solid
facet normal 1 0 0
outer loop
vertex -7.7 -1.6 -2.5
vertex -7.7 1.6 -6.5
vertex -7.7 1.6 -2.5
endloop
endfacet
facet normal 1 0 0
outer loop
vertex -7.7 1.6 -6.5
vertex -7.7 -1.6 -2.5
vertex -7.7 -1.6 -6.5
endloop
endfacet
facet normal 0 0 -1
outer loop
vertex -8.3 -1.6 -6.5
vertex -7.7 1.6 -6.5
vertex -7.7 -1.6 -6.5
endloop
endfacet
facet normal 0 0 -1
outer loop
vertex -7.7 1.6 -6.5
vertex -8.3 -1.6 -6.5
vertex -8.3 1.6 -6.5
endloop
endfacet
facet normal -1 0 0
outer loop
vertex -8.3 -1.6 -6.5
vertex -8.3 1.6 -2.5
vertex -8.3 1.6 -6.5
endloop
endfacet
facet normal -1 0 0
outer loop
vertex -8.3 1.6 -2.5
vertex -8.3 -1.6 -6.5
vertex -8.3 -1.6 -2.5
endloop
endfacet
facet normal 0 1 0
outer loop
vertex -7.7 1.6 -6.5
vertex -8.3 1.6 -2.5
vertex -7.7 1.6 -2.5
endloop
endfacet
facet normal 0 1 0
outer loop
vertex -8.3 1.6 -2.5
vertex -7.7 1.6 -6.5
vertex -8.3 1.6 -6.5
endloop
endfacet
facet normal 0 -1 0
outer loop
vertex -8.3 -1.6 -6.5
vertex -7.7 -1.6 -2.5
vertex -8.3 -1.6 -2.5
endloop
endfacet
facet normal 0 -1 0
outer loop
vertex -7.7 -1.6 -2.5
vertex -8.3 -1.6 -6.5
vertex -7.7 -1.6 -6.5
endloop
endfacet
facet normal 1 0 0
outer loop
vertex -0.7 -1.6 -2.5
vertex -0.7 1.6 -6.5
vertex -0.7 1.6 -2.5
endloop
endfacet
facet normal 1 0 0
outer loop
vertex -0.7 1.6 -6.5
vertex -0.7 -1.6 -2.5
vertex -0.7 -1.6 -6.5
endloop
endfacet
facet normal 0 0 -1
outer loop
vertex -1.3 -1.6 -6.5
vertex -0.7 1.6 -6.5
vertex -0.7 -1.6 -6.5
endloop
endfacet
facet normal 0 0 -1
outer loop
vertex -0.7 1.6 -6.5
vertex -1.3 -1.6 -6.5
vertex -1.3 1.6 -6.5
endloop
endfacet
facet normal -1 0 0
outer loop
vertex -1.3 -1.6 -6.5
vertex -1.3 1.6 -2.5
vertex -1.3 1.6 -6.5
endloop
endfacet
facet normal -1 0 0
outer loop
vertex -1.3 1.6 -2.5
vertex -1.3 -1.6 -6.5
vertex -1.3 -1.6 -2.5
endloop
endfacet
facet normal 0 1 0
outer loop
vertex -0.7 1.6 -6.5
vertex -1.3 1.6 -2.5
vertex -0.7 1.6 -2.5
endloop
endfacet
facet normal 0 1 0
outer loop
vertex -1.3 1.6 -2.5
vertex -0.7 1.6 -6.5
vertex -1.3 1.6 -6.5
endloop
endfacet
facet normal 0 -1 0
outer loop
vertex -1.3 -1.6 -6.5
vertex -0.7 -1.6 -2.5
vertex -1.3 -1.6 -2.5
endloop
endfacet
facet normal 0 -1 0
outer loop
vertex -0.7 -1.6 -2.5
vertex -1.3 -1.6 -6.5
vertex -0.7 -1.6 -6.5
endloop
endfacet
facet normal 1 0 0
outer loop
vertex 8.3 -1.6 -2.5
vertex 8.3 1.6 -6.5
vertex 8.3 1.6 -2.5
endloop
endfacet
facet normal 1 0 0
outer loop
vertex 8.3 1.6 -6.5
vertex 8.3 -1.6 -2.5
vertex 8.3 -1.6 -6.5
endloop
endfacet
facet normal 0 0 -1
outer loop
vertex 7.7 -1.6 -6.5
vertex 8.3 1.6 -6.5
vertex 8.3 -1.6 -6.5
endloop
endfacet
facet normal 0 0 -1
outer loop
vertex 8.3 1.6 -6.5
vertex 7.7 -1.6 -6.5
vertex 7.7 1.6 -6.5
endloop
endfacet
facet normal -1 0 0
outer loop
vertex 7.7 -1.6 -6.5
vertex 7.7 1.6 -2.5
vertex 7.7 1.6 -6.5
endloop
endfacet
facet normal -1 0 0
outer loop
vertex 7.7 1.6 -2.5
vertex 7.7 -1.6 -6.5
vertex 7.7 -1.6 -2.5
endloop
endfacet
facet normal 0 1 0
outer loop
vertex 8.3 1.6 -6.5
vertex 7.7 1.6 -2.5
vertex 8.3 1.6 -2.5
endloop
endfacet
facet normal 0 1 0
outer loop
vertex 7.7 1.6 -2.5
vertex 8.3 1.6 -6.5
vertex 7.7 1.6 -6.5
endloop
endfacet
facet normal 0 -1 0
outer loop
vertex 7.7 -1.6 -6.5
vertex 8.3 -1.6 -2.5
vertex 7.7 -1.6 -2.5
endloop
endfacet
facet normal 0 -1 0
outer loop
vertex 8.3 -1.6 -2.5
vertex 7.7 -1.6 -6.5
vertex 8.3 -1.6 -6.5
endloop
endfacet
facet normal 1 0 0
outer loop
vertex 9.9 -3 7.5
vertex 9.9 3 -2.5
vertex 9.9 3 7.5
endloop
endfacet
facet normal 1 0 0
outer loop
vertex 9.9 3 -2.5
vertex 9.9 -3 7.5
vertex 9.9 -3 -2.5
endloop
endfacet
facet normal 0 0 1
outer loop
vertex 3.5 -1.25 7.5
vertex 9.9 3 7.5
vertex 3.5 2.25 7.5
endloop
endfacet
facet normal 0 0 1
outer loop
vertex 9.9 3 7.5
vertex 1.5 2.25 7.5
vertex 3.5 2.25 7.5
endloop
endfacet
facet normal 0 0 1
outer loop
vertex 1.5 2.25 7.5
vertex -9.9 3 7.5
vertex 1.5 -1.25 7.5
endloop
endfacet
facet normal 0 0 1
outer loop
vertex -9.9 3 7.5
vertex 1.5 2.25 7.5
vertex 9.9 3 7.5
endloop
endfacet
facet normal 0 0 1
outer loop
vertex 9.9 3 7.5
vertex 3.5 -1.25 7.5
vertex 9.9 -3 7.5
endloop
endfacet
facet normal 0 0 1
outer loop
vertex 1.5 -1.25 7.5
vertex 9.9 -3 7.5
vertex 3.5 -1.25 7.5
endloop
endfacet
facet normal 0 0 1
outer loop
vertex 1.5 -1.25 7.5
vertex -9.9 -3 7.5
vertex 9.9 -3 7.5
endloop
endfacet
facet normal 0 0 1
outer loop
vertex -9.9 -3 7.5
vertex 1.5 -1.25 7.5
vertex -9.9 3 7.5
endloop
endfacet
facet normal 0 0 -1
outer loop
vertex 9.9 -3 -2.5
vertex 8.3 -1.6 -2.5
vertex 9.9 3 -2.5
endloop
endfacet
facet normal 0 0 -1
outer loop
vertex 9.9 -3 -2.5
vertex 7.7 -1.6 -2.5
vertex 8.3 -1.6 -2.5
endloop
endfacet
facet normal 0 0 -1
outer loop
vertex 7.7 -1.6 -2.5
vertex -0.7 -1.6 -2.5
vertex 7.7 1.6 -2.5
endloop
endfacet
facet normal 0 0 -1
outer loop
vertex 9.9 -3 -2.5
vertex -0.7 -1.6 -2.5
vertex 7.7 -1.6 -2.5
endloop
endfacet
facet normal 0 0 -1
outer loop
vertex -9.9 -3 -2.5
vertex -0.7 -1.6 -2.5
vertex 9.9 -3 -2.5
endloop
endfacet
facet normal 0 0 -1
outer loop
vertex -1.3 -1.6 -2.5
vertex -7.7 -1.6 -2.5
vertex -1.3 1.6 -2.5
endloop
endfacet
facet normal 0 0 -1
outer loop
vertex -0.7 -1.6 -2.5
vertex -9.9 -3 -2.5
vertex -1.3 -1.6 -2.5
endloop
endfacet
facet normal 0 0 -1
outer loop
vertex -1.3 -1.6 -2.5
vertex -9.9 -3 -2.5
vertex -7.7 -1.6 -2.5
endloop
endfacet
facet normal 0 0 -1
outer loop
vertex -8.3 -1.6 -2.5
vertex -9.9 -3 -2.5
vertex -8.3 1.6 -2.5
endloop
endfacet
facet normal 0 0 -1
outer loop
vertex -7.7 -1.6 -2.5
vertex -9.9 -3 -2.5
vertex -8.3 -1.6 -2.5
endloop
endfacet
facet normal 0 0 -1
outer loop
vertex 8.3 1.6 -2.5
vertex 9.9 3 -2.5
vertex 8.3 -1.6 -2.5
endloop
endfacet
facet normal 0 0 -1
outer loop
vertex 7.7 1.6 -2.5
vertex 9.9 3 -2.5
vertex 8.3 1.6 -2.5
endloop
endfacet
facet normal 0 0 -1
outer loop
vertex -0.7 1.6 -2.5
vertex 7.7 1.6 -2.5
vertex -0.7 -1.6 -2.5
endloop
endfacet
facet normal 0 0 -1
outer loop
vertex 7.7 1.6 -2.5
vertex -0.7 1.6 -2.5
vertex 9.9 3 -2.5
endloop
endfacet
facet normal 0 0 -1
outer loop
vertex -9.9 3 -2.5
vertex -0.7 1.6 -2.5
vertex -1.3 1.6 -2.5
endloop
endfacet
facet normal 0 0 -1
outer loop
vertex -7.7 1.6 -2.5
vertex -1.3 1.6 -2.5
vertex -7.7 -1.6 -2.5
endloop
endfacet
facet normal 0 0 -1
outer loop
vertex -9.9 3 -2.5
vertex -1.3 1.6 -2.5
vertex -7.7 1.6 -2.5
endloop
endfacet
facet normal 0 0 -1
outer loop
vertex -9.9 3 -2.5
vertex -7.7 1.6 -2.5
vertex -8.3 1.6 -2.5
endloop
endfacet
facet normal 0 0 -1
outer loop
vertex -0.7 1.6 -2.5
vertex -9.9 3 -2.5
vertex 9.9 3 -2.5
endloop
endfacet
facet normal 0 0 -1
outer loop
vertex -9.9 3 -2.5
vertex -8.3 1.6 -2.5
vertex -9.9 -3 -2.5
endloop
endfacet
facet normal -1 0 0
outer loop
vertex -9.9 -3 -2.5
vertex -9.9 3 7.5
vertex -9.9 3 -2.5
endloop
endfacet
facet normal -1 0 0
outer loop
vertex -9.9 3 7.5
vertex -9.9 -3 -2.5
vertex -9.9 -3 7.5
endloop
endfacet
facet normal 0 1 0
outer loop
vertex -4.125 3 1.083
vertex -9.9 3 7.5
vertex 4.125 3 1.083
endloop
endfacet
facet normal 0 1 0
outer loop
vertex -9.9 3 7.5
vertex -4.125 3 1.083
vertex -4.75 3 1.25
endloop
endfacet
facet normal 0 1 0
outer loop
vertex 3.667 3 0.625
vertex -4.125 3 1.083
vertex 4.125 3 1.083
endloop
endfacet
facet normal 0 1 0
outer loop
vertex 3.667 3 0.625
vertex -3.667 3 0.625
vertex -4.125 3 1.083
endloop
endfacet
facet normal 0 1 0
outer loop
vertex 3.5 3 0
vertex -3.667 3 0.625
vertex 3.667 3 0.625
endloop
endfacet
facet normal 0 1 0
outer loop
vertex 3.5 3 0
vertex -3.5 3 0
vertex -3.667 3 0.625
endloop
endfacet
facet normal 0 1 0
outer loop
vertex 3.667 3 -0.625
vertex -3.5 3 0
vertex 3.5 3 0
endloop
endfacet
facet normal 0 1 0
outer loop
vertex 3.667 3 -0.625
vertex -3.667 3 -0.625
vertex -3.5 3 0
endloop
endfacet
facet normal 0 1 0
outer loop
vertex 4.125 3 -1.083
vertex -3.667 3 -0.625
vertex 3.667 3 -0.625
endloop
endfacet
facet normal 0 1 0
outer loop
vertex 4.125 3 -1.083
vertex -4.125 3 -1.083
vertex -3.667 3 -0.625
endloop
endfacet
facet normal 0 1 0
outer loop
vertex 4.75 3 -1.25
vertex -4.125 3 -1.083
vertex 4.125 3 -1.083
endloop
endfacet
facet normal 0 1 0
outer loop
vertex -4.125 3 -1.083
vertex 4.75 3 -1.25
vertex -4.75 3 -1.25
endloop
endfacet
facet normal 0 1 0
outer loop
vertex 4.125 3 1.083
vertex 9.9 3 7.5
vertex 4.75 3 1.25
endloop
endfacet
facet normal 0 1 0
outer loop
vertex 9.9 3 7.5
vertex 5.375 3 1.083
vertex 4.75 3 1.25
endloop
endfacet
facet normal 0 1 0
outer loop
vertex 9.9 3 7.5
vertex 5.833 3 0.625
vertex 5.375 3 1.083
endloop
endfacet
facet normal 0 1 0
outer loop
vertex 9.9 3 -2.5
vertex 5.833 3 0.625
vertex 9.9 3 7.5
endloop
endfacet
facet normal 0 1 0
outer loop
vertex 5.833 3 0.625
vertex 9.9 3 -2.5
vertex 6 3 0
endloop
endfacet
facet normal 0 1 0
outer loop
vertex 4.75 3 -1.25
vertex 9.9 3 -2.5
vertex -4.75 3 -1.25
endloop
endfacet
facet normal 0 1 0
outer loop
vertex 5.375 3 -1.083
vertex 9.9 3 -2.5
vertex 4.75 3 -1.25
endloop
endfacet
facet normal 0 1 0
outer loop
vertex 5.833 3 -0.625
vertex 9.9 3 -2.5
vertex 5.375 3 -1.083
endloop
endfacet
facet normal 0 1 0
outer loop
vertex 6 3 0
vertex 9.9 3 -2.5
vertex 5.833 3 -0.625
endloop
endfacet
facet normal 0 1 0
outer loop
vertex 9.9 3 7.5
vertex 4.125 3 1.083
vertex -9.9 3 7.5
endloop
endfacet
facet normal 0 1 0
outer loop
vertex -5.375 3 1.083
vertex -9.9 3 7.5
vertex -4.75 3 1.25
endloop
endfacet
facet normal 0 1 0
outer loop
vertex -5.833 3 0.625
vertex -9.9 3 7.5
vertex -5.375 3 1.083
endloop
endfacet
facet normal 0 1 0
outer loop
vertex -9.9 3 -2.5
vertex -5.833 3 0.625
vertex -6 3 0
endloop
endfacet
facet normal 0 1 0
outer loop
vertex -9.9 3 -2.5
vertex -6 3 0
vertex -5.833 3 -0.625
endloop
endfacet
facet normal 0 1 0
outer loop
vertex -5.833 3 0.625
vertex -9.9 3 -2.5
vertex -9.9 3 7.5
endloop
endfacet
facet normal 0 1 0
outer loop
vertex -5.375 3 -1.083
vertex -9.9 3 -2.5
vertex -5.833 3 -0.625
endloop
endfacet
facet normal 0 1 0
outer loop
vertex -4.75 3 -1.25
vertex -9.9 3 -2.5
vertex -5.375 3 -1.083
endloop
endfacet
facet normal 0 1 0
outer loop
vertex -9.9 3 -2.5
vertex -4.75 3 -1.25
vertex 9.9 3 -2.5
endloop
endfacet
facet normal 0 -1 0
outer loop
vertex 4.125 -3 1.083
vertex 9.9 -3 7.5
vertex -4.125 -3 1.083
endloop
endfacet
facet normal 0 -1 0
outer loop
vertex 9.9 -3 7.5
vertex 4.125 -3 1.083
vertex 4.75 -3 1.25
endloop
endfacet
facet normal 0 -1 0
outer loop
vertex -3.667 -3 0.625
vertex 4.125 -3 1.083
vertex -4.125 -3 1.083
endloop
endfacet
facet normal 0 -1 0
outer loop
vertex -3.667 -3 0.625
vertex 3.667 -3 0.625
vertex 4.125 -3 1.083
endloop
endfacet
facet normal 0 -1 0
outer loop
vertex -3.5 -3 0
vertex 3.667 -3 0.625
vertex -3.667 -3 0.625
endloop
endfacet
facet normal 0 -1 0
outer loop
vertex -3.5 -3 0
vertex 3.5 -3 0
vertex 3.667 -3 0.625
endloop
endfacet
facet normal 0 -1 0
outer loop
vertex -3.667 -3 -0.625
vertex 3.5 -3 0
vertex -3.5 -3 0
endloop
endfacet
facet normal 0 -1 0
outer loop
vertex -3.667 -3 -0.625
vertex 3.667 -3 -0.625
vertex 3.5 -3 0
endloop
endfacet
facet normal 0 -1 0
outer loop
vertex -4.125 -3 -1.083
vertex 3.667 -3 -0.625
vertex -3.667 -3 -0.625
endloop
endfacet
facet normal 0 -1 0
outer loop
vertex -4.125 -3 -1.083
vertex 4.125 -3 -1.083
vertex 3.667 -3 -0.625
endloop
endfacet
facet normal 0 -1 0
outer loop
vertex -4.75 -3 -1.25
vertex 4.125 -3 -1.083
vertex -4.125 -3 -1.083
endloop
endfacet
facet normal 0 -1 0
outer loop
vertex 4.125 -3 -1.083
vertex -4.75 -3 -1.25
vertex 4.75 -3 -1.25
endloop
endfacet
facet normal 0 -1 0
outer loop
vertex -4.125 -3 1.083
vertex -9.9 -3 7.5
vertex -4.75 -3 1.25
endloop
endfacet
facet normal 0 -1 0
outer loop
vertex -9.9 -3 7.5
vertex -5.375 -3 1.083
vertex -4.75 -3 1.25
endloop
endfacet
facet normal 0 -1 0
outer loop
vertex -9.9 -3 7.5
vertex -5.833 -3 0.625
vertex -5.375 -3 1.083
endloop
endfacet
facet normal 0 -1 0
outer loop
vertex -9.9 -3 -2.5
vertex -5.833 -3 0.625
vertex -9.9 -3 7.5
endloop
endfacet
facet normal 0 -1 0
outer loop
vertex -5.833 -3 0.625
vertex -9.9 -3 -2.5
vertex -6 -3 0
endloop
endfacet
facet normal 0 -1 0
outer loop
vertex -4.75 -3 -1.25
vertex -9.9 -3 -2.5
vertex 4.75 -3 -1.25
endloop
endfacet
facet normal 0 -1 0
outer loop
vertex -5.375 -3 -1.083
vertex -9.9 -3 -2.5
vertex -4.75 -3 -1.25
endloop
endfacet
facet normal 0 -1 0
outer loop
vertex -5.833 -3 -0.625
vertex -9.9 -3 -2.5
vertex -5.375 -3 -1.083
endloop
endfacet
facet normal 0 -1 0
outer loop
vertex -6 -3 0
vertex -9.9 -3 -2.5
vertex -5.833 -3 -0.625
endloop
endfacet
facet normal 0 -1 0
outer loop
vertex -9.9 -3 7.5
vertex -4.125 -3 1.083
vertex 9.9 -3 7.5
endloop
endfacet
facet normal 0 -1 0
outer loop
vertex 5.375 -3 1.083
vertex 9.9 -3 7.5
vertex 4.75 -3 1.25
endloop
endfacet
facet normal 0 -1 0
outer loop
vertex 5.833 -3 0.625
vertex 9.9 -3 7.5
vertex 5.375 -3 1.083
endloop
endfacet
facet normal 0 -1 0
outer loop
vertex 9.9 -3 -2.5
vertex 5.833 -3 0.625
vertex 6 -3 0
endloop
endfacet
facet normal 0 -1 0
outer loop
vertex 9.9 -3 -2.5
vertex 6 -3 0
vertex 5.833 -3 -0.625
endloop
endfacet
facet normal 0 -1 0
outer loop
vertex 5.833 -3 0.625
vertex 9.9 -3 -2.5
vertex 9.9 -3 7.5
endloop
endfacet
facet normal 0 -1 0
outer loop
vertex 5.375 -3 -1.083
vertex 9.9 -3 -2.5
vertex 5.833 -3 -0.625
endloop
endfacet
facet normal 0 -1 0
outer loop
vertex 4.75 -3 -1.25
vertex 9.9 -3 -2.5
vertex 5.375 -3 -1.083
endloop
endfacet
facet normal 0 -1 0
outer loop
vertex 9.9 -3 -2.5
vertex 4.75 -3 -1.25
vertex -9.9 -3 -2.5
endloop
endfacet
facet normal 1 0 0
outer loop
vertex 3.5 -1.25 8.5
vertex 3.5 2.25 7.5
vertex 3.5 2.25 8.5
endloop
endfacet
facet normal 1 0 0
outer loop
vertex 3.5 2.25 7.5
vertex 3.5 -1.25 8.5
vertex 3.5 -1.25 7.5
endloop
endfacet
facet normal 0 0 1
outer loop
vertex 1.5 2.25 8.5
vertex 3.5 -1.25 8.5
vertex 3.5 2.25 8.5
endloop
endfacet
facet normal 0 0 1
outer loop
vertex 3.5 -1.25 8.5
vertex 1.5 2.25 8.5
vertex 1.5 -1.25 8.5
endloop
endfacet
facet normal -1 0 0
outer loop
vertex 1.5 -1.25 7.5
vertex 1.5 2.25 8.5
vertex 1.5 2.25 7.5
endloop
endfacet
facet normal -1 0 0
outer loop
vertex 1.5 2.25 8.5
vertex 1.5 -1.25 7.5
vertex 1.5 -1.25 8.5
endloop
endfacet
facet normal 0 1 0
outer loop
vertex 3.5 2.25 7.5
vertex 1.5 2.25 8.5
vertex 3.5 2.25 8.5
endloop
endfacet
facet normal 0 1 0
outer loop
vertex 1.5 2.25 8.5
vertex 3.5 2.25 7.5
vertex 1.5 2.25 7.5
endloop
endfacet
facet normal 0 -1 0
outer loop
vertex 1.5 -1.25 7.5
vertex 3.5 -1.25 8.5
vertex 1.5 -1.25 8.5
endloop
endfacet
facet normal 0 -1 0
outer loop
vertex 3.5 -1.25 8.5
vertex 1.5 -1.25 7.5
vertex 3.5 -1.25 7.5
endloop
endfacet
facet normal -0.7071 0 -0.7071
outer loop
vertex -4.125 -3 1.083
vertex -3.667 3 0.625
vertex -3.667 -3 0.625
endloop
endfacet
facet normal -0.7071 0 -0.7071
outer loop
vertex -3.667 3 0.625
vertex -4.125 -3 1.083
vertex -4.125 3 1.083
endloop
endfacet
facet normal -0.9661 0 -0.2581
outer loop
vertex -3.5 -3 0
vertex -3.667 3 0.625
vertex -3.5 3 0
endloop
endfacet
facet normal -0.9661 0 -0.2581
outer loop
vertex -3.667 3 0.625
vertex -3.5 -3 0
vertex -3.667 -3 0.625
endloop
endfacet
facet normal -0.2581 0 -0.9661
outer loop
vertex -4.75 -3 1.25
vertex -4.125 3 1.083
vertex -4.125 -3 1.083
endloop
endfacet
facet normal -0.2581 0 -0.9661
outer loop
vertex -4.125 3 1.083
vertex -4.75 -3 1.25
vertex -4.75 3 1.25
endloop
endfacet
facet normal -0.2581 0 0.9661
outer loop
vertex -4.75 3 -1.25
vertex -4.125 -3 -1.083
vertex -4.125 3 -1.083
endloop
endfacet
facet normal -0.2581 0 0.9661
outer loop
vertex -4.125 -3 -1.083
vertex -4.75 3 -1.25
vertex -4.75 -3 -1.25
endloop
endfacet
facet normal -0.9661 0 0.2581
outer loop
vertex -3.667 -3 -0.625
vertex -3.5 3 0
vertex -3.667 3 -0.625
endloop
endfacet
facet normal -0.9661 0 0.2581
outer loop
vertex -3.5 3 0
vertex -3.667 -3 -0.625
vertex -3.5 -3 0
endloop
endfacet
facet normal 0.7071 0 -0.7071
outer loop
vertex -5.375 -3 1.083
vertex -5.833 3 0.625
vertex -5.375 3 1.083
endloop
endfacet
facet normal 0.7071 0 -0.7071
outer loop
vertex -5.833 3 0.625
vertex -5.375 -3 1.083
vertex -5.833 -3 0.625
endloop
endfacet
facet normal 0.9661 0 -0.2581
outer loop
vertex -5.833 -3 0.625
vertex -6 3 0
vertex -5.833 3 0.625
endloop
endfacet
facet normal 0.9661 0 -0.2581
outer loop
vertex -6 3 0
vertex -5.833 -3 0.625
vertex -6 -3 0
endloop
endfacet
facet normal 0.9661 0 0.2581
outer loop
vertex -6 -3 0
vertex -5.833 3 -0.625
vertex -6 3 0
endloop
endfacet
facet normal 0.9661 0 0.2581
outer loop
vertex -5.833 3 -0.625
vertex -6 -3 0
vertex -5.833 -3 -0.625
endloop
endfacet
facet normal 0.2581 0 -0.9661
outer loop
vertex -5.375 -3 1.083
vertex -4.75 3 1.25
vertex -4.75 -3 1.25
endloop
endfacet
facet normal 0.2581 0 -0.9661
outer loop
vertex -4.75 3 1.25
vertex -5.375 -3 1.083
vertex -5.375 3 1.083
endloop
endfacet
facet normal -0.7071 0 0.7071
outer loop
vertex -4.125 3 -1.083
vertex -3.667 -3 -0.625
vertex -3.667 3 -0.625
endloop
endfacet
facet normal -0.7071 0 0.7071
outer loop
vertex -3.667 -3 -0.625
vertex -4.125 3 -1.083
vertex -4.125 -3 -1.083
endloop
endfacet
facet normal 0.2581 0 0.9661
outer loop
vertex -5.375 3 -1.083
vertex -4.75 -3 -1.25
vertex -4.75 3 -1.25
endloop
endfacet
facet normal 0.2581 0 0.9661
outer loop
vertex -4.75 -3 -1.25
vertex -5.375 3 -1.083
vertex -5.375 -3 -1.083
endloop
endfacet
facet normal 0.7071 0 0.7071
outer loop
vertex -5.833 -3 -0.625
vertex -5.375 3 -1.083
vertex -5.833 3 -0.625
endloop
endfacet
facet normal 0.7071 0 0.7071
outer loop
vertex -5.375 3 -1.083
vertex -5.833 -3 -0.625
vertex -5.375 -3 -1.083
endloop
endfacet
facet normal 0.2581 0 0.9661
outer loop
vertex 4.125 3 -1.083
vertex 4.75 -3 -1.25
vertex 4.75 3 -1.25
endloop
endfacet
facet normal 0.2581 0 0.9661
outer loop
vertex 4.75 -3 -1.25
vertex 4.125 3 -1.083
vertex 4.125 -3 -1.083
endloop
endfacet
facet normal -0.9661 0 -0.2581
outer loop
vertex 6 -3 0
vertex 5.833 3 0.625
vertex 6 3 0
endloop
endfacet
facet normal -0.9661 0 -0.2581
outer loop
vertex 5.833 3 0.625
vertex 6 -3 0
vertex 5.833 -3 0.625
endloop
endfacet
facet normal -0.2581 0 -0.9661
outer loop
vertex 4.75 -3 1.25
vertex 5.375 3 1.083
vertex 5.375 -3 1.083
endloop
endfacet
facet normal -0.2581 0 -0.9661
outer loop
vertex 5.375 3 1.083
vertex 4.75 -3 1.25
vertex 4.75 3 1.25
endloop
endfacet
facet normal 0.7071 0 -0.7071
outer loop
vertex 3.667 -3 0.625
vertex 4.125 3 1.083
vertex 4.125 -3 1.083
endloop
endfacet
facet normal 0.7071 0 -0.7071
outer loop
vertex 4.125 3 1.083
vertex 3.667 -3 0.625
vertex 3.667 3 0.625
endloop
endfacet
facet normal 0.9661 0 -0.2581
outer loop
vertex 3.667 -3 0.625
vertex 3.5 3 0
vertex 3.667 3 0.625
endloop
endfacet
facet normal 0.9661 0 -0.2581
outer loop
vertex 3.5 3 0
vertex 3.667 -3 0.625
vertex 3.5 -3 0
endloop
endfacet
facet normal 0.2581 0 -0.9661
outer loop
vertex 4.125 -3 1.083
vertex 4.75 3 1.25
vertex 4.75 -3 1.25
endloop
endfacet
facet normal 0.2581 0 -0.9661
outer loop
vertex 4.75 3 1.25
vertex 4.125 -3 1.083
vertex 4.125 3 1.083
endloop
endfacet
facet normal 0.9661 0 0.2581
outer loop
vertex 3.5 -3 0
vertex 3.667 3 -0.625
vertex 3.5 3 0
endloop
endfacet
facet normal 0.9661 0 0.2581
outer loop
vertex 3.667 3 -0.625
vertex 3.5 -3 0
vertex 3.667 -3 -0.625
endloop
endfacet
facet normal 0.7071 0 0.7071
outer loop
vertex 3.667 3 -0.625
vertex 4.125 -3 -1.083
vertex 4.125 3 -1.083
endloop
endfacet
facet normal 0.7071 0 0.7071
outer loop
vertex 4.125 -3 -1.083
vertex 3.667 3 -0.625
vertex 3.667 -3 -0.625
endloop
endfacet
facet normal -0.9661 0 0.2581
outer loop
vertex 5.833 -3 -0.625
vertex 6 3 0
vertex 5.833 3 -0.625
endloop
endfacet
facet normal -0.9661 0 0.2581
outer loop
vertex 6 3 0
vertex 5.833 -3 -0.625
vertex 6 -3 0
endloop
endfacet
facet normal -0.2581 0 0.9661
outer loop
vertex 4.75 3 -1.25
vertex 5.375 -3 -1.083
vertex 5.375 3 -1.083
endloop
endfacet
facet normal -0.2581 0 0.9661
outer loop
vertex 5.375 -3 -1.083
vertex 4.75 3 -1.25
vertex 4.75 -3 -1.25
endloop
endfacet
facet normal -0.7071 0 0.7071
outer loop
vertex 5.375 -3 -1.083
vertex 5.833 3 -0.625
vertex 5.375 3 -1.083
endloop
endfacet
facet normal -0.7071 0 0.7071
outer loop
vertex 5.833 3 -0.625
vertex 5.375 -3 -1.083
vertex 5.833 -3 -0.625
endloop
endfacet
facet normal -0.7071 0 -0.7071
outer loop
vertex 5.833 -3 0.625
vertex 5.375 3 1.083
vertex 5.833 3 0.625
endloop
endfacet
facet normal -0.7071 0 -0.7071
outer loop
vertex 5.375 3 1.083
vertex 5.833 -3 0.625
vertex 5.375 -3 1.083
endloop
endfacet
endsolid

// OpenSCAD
// Don't print this file, purchase real micro switches
// (Honeywell ZM10B10A01 or similar).

module microswitch() {
  difference() {
    union() {
      translate([0, 0, 2.5])
        cube([19.8, 6, 10], center=true);
      translate([2.5, 0.5, 6])
        cube([2, 3.5, 5], center=true);
      for (x = [-8, -1, 8]) {
        translate([x, 0, 0])
          cube([0.6, 3.2, 13], center=true);
      }
    }
    for (x = [-9.5/2, 9.5/2]) {
      translate([x, 0, 0]) rotate([90, 0, 0])
        cylinder(r=2.5/2, h=20, center=true, $fn=12);
    }
  }
}

microswitch();
